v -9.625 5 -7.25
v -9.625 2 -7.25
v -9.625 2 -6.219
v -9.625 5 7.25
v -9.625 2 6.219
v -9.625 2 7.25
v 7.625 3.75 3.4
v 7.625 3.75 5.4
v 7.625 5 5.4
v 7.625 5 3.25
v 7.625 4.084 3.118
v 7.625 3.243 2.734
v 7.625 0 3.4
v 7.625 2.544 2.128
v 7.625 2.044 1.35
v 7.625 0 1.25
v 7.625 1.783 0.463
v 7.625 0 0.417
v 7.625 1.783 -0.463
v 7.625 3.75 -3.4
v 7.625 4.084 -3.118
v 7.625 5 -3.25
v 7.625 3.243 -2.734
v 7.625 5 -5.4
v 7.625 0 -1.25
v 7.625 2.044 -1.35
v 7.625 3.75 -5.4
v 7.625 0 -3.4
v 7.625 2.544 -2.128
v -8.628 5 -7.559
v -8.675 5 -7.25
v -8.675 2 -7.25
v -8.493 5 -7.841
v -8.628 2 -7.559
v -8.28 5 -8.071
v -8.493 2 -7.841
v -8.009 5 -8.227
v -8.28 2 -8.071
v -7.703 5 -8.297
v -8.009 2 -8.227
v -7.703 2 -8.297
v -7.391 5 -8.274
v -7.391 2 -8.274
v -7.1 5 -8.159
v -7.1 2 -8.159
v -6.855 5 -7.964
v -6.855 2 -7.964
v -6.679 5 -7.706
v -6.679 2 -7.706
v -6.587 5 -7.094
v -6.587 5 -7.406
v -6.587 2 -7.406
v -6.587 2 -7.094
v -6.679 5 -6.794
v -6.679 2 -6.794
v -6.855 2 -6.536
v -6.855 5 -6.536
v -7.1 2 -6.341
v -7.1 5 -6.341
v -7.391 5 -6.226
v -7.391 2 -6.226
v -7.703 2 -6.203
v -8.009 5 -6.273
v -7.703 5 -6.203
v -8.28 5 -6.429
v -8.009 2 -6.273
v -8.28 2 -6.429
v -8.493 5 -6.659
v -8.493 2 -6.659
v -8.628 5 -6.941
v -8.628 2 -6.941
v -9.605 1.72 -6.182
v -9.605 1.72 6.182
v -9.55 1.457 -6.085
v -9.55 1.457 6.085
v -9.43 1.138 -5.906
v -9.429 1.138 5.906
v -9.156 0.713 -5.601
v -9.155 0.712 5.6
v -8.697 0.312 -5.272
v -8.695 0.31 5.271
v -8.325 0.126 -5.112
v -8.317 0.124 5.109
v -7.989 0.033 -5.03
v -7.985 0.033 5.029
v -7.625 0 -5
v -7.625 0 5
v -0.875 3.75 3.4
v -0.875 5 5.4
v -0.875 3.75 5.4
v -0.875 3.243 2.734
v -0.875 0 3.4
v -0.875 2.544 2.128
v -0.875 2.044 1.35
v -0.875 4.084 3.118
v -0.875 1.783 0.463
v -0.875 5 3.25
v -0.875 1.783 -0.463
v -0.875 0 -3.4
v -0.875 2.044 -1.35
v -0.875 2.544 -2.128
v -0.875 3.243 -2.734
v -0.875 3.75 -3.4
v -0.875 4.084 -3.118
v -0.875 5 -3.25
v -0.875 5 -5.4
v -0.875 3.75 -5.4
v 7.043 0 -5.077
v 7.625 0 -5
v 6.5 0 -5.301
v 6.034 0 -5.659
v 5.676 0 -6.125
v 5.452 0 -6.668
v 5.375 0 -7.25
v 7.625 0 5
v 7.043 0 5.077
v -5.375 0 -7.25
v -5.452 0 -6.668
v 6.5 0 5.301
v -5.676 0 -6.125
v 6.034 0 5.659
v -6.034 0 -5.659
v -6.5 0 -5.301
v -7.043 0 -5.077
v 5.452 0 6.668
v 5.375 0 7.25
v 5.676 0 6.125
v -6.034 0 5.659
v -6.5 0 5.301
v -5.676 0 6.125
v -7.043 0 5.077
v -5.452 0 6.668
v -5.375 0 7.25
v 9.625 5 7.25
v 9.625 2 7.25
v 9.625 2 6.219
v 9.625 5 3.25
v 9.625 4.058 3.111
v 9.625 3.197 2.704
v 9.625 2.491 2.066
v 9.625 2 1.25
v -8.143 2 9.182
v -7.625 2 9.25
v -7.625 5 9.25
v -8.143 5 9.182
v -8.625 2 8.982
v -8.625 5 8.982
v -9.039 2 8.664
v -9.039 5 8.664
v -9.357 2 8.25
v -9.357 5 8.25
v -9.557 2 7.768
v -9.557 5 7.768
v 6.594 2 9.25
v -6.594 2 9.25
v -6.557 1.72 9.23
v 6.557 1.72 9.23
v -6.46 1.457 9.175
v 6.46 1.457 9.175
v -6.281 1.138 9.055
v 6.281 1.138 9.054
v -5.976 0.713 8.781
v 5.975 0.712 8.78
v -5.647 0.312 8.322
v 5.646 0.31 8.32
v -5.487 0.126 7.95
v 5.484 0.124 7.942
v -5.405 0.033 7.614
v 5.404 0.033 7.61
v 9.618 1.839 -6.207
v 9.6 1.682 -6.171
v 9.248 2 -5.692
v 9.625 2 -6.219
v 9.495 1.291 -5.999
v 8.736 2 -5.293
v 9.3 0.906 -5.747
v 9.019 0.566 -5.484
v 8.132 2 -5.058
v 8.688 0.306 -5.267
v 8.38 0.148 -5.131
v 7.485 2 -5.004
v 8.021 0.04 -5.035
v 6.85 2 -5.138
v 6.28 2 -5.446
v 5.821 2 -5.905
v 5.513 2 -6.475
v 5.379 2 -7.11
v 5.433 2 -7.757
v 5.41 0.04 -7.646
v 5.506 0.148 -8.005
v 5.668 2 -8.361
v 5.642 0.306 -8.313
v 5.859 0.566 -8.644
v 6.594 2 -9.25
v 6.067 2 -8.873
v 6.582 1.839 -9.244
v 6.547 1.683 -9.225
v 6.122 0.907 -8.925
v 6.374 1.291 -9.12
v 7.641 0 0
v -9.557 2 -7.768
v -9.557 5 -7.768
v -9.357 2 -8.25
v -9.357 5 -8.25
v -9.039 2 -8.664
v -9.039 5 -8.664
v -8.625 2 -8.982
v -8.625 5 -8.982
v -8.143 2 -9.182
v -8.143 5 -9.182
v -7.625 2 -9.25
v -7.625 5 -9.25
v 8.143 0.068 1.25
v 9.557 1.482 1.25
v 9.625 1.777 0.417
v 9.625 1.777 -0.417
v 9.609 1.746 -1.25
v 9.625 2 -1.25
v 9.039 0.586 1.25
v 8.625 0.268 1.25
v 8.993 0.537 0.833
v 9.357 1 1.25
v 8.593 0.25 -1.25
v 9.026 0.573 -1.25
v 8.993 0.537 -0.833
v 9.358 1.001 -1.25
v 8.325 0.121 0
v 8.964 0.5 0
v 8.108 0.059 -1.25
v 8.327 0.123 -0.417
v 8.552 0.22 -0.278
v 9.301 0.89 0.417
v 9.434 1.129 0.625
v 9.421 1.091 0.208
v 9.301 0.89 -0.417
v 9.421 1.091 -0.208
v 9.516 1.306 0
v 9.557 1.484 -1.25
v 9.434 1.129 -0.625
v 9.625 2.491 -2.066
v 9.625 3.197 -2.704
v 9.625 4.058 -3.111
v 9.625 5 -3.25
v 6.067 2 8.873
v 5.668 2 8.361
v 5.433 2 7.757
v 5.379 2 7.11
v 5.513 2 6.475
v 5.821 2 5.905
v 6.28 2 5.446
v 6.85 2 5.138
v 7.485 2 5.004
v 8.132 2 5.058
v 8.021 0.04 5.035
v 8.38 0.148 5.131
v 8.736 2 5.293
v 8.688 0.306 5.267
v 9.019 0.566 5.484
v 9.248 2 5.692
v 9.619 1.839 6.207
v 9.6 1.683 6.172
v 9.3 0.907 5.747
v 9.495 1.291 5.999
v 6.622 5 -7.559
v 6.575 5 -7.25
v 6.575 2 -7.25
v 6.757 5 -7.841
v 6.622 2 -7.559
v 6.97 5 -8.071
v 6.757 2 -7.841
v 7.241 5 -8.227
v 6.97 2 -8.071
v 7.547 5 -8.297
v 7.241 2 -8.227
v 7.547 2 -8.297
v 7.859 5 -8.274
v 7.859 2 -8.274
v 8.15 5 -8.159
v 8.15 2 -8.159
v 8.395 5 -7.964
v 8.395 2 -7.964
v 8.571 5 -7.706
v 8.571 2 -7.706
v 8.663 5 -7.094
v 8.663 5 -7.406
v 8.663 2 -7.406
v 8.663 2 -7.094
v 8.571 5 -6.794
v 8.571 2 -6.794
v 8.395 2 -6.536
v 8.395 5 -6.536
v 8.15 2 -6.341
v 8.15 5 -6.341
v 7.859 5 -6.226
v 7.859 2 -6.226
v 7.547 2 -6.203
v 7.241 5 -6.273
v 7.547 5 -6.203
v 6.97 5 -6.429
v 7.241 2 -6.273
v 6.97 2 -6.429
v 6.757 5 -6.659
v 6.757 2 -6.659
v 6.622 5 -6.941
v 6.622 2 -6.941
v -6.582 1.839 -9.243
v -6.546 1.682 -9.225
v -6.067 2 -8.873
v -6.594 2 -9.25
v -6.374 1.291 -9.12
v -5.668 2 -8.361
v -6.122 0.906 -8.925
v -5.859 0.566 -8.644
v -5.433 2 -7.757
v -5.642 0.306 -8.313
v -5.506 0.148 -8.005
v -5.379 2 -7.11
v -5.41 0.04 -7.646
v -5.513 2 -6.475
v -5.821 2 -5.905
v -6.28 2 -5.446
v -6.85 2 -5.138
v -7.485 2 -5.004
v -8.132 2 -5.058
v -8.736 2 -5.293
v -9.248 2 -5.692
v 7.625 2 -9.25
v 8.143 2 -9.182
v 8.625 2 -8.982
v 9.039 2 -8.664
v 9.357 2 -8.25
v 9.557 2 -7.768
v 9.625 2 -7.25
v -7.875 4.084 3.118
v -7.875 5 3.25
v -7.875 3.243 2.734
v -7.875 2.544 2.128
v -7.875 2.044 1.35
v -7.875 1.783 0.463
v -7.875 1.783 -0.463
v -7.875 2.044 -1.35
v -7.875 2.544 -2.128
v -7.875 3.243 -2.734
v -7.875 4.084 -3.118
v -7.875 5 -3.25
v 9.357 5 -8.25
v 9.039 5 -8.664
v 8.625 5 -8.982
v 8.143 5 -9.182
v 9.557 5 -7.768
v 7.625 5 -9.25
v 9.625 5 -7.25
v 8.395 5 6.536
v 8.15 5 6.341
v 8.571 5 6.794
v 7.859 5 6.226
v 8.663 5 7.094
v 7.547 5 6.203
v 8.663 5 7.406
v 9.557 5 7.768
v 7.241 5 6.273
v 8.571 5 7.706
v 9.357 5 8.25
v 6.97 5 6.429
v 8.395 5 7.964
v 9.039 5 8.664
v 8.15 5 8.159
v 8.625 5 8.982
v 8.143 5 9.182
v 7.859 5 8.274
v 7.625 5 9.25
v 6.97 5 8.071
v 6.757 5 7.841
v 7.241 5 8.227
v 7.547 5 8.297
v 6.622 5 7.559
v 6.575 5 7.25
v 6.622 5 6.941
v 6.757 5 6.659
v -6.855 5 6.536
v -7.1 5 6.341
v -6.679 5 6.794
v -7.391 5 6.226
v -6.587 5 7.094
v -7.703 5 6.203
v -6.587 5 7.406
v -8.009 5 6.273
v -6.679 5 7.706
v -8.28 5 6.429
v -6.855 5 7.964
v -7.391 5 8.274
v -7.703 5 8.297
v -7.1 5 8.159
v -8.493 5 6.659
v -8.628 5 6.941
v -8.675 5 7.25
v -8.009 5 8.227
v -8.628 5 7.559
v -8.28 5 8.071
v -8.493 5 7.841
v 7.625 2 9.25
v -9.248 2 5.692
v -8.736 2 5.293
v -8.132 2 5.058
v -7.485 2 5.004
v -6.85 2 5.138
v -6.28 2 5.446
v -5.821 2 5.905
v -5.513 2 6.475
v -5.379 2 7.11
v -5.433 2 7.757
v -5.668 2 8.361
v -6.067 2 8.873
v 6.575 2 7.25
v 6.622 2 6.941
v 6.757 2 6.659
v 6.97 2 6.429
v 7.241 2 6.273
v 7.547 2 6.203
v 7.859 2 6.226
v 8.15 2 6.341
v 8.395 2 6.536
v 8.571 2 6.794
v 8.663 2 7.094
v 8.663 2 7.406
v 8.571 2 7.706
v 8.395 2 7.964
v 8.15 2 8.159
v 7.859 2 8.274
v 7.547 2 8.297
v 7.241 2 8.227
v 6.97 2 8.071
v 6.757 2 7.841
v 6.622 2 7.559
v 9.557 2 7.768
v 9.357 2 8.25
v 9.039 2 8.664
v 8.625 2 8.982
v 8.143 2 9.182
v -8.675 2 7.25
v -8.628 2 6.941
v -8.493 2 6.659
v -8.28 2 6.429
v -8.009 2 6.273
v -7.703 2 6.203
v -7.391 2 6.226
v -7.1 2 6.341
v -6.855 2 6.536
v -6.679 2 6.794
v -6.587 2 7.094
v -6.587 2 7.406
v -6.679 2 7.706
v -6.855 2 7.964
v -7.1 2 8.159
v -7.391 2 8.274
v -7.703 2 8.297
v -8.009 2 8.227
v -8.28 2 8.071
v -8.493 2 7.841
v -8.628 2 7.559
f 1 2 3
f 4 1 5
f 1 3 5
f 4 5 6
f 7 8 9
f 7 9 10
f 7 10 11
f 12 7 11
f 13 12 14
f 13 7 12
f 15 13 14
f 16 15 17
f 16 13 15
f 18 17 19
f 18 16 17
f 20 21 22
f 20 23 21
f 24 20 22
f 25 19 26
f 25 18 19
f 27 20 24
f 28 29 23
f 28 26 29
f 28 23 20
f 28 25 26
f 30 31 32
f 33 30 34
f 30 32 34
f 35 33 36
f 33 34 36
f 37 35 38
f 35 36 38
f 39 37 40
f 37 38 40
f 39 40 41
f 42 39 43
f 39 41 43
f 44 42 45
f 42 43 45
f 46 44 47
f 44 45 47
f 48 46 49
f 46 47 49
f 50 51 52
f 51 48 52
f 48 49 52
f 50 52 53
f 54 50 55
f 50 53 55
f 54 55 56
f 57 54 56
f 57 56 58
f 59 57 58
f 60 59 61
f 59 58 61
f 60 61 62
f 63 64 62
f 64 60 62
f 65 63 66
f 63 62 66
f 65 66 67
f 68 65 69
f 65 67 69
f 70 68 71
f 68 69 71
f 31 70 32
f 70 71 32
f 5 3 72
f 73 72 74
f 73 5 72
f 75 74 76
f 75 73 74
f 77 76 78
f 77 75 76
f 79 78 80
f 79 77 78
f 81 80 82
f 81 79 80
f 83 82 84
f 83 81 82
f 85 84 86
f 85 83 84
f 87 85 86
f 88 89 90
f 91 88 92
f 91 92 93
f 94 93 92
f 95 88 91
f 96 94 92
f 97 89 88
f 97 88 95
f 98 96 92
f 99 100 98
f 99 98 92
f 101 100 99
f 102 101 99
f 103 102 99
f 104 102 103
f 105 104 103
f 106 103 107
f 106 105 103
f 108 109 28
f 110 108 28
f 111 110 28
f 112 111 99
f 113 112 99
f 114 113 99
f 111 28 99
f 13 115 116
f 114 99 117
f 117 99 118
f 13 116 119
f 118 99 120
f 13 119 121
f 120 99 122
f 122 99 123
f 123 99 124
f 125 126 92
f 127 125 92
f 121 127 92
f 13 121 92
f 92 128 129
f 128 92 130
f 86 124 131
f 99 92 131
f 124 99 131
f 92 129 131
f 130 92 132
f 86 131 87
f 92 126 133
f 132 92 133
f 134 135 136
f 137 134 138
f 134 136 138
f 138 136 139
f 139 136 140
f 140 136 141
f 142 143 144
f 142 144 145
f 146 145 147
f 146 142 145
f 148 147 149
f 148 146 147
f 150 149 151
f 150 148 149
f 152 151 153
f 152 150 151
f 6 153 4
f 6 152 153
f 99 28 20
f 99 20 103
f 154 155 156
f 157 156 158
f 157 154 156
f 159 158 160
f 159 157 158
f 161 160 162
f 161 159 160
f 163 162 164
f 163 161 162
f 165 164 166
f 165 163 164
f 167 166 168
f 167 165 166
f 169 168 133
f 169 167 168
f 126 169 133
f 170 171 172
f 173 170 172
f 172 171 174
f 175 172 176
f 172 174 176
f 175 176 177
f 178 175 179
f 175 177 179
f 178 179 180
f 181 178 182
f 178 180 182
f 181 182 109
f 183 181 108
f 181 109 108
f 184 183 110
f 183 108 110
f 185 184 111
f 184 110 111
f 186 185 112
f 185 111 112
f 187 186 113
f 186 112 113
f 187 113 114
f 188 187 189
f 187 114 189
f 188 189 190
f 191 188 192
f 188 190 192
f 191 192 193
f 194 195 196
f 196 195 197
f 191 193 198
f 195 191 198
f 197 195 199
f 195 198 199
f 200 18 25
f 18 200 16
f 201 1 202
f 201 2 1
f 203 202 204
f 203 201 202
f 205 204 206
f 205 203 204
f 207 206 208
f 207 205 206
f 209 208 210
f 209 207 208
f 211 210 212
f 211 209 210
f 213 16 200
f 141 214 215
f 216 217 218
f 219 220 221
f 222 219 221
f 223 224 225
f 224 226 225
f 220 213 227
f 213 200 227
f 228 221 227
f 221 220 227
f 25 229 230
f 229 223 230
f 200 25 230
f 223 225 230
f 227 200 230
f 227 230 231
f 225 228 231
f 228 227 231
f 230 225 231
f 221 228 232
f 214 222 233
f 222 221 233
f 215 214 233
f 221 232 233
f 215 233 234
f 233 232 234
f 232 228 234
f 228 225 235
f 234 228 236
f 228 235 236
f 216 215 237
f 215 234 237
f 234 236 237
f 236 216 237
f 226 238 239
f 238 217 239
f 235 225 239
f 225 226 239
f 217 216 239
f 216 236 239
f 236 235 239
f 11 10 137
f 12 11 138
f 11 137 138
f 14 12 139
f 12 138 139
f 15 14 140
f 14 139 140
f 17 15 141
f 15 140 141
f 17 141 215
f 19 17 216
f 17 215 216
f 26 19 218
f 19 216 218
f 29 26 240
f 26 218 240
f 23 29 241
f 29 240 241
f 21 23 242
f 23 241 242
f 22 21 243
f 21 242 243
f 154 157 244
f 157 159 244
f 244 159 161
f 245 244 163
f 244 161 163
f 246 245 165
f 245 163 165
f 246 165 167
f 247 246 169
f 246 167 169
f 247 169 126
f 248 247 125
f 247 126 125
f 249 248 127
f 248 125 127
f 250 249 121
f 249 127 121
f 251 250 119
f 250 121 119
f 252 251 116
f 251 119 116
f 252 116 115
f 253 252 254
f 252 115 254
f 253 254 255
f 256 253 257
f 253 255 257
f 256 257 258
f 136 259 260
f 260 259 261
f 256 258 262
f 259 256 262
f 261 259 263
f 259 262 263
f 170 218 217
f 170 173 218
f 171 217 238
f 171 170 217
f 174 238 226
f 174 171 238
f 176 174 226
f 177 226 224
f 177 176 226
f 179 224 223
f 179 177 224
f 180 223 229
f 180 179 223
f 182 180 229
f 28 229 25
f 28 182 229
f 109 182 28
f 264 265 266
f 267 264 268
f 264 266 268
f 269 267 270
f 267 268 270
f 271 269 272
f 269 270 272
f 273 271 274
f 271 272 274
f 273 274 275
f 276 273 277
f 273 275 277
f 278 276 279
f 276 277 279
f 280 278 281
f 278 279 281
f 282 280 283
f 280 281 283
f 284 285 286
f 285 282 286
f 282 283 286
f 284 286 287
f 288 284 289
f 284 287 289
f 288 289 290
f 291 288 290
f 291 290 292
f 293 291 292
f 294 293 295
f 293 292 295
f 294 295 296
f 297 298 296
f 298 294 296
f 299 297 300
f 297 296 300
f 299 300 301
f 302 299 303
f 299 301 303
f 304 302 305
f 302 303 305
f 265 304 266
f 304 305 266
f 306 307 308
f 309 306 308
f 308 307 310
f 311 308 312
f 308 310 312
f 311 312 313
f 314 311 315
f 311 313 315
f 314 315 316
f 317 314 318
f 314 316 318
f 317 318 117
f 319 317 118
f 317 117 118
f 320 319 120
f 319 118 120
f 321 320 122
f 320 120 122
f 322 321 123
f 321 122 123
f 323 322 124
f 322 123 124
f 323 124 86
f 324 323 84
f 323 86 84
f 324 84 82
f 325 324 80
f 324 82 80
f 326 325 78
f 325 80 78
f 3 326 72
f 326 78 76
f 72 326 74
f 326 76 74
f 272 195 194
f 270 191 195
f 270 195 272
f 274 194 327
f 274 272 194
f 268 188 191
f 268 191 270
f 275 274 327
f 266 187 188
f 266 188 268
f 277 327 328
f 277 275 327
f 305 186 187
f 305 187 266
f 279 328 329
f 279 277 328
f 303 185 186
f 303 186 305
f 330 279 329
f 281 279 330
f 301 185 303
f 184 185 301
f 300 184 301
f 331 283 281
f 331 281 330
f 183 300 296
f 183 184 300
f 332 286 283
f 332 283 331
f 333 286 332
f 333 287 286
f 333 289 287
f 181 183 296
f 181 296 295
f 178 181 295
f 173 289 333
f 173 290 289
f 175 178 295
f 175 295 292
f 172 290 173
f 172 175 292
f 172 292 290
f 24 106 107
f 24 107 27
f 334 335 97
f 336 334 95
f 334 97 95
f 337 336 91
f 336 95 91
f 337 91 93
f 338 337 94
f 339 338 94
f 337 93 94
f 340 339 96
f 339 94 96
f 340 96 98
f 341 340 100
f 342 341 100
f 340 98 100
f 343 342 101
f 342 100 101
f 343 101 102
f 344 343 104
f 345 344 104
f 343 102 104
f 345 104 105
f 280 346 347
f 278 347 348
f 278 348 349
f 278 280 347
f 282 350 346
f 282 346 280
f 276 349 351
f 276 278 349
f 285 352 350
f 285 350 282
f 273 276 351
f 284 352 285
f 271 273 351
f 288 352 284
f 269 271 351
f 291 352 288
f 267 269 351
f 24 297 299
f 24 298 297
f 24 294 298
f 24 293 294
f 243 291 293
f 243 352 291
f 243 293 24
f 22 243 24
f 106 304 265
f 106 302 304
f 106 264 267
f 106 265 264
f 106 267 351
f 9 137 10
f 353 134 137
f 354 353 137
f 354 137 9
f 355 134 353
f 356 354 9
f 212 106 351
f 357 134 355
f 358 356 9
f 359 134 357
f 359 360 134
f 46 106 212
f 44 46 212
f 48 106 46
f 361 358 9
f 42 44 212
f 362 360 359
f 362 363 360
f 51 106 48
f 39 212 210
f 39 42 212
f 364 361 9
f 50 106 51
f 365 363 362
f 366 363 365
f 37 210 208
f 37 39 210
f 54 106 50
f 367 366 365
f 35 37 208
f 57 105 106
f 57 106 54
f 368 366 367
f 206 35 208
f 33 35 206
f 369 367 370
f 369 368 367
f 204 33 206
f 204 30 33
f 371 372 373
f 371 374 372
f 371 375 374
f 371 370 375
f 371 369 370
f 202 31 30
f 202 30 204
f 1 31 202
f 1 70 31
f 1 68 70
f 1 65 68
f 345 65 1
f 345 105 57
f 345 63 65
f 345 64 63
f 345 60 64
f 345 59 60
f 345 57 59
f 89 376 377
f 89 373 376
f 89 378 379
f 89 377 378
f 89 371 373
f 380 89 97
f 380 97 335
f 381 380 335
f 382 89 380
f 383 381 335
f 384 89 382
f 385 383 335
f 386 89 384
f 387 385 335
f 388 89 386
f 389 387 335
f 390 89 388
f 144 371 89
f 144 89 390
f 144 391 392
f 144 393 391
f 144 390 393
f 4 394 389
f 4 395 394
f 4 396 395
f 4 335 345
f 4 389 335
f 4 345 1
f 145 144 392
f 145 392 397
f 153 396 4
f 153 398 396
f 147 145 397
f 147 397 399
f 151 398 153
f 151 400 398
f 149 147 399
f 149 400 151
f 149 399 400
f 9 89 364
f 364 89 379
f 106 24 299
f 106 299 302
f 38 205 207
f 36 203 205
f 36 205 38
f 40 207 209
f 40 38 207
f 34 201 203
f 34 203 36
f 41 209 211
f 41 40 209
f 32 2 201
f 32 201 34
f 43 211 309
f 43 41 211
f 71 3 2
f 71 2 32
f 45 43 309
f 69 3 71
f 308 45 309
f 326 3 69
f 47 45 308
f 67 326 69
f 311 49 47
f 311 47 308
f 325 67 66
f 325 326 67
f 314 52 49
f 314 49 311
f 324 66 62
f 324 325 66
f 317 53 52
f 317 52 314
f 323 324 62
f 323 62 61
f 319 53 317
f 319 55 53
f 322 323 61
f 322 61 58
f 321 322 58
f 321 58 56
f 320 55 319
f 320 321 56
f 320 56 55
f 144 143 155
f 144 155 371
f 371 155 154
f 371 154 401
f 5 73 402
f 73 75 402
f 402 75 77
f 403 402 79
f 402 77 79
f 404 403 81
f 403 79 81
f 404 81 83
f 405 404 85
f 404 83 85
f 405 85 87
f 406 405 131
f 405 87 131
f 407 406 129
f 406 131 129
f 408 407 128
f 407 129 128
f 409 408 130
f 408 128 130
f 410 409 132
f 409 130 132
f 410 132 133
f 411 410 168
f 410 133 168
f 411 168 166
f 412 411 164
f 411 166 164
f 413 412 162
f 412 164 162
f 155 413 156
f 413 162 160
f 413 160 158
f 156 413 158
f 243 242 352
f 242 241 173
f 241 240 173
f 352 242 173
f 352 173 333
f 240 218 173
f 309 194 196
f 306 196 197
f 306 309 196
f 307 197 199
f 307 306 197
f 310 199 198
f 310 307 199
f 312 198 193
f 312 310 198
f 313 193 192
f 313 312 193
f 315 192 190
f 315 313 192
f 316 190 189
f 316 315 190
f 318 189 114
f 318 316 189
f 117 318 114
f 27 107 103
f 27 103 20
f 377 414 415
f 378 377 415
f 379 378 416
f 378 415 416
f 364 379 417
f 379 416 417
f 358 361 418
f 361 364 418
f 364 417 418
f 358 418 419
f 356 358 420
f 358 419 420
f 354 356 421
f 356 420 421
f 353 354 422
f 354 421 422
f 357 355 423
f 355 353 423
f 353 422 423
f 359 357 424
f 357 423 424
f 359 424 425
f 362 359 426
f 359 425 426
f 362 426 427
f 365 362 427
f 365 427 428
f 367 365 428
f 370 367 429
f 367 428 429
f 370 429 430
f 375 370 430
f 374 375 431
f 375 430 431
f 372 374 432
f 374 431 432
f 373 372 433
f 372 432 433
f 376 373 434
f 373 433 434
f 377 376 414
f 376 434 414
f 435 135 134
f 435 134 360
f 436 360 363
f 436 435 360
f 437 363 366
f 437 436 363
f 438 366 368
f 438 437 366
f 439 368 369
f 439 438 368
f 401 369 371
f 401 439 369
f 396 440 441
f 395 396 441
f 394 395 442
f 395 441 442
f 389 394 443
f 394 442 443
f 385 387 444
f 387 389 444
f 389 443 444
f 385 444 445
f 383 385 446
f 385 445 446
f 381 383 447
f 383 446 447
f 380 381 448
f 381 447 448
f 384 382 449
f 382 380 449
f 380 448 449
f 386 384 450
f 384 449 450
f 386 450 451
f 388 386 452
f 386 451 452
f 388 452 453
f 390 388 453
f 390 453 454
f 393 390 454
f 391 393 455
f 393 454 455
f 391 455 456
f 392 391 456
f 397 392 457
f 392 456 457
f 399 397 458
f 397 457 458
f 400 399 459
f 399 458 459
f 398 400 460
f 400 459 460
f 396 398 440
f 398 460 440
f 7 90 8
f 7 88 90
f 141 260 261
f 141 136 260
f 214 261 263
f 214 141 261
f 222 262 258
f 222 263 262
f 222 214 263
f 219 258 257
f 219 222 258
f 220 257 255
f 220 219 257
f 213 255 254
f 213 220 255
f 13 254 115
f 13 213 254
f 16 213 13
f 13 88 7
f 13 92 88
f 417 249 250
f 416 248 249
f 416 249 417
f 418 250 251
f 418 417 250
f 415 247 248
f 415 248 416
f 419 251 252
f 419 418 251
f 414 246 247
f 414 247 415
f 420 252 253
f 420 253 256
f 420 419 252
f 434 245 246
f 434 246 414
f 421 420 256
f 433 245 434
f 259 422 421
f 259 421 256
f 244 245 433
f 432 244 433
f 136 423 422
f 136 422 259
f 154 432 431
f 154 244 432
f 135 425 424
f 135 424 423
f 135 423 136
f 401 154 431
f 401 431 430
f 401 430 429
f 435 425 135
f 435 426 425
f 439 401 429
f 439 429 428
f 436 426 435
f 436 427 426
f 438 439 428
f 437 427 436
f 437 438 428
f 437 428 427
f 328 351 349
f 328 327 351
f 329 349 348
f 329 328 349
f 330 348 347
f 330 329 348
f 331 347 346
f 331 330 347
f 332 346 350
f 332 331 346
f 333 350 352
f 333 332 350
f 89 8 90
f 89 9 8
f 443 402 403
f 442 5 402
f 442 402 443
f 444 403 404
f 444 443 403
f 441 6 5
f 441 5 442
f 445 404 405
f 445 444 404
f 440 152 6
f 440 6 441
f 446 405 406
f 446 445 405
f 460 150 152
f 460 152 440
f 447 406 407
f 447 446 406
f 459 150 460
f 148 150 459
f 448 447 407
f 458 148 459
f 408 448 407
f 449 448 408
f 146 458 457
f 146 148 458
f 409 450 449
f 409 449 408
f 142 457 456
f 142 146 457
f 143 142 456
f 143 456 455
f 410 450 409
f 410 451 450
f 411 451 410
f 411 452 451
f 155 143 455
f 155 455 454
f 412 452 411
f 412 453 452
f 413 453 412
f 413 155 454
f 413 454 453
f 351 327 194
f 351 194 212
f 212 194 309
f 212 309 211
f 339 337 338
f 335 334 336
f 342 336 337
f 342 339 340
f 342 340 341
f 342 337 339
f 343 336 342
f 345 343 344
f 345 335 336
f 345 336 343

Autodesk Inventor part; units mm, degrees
ref_plane "YZ Plane" through (0, 0, 0) normal (1, 0, 0) x (0, 1, 0)
ref_plane "XZ Plane" through (0, 0, 0) normal (0, 1, 0) x (-1, 0, 0)
ref_plane "XY Plane" through (0, 0, 0) normal (0, 0, 1) x (1, 0, 0)
sketch "スケッチ1" plane through (0, 0, 0) normal (0, 0, 1) x (1, 0, 0)
  point P0 (0, 0)
sketch "スケッチ2" plane through (0, 0, 0) normal (0, 1, 0) x (-1, 0, 0)
  line L0 (7.625, 9.25) -> (-7.625, 9.25)
  line L1 (-9.625, 7.25) -> (-9.625, -7.25)
  line L2 (-7.625, -9.25) -> (7.625, -9.25)
  line L3 (9.625, -7.25) -> (9.625, 7.25)
  line L4 (9.625, 9.25) -> (-9.625, -9.25) construction
  line L5 (-9.625, 9.25) -> (9.625, -9.25) construction
  circle A0 centre (7.625, -7.25) radius 1.05
  arc A1 (7.625, -9.25) -> (9.625, -7.25) centre (7.625, -7.25) ccw
  circle A2 centre (7.625, 7.25) radius 1.05
  arc A3 (9.625, 7.25) -> (7.625, 9.25) centre (7.625, 7.25) ccw
  circle A4 centre (-7.625, 7.25) radius 1.05
  circle A5 centre (-7.625, -7.25) radius 1.05
  arc A6 (-7.625, 9.25) -> (-9.625, 7.25) centre (-7.625, 7.25) ccw
  arc A7 (-9.625, -7.25) -> (-7.625, -9.25) centre (-7.625, -7.25) ccw
  point P0 (0, 0)
  dimension "d0" = 19.25
  dimension "d1" = 18.5
  dimension "ねじ穴" = 2.1
  dimension "d6" = 2
  dimension "d7" = 2
  dimension "d8" = 2
  dimension "d9" = 2
  dimension "d10" = 2.1
  dimension "d11" = 2.1
  dimension "d12" = 2.1
  dimension "d13" = 2
  dimension "d14" = 2
  dimension "d15" = 2
  dimension "d16" = 2
extrude "押し出し1" add sketch "スケッチ2" along normal blind 5
sketch "スケッチ3" plane through (9.625, 0, 7.25) normal (1, 0, 0) x (0, 0, -1)
  line L0 (0, 5) -> (14.5, 5) projected
  circle A0 centre (7.25, 5) radius 3.25
  point P0 (7.25, 0)
  dimension "d19" = 6.5
extrude "押し出し2" cut sketch "スケッチ3" against normal blind 17.5
sketch "スケッチ4" plane through (0, 0, 0) normal (0, -1, 0) x (1, 0, 0)
  circle A0 centre (-7.625, 7.25) radius 1.05 projected
  circle A1 centre (-7.625, 7.25) radius 2.25
  circle A2 centre (7.625, 7.25) radius 1.05 projected
  circle A3 centre (7.625, 7.25) radius 2.25
  circle A4 centre (7.625, -7.25) radius 1.05 projected
  circle A5 centre (7.625, -7.25) radius 2.25
  circle A6 centre (-7.625, -7.25) radius 1.05 projected
  circle A7 centre (-7.625, -7.25) radius 2.25
  point P0 (0, 0)
  dimension "d22" = 4.5
  dimension "d23" = 4.5
  dimension "d24" = 4.5
  dimension "d25" = 4.5
extrude "押し出し3" cut sketch "スケッチ4" against normal blind 2
fillet "フィレット1" radius 2 4 edges at (0, 0, 9.25) (-9.625, 0, 0) (0, 0, -9.25) (9.625, 0, 0)
sketch "スケッチ5" plane through (0, 0, 0) normal (0, -1, 0) x (1, 0, 0)
  line L0 (-0.875, 3.4) -> (7.625, 3.4)
  line L1 (7.625, 3.4) -> (7.625, -3.4)
  line L2 (7.625, -3.4) -> (-0.875, -3.4)
  line L3 (-0.875, -3.4) -> (-0.875, 3.4)
  line L4 (9.625, 1.25) -> (9.625, 6.2192) projected
  point P0 (0, 0)
  point P1 (-0.875, 0)
  dimension "d29" = 2
  dimension "d30" = 6.8
  dimension "d31" = 8.5
  dimension "d32" = 0
extrude "押し出し4" cut sketch "スケッチ5" against normal through all
sketch "スケッチ6" plane through (0, 5, 0) normal (0, 1, 0) x (1, 0, 0)
  line L0 (7.625, -5.4) -> (-0.875, -5.4)
  line L1 (-0.875, -5.4) -> (-0.875, 5.4)
  line L2 (-0.875, 5.4) -> (7.625, 5.4)
  line L3 (7.625, 5.4) -> (7.625, -5.4)
  line L4 (9.625, -7.25) -> (9.625, -3.25) projected
  point P0 (0, 0)
  point P1 (-0.875, 0)
  point P2 (-0.875, -3.4)
  point P3 (7.625, -3.4)
  dimension "d35" = 2
  dimension "d36" = 8.5
  dimension "d37" = 10.8
  dimension "d38" = 0
  dimension "d39" = 8.5
extrude "押し出し5" cut sketch "スケッチ6" against normal blind 1.25
equation "\"d7\" = d6"
equation "\"d8\" = d6"
equation "\"d9\" = d6"
equation "\"d10\" = ねじ穴"
equation "\"d11\" = ねじ穴"
equation "\"d12\" = ねじ穴"
equation "\"d13\" = d6"
equation "\"d14\" = d6"
equation "\"d15\" = d6"
equation "\"d16\" = d6"
equation "\"d23\" = d22"
equation "\"d24\" = d22"
equation "\"d25\" = d22"
equation "\"d36\" = d39"
properties part number "カバー"
